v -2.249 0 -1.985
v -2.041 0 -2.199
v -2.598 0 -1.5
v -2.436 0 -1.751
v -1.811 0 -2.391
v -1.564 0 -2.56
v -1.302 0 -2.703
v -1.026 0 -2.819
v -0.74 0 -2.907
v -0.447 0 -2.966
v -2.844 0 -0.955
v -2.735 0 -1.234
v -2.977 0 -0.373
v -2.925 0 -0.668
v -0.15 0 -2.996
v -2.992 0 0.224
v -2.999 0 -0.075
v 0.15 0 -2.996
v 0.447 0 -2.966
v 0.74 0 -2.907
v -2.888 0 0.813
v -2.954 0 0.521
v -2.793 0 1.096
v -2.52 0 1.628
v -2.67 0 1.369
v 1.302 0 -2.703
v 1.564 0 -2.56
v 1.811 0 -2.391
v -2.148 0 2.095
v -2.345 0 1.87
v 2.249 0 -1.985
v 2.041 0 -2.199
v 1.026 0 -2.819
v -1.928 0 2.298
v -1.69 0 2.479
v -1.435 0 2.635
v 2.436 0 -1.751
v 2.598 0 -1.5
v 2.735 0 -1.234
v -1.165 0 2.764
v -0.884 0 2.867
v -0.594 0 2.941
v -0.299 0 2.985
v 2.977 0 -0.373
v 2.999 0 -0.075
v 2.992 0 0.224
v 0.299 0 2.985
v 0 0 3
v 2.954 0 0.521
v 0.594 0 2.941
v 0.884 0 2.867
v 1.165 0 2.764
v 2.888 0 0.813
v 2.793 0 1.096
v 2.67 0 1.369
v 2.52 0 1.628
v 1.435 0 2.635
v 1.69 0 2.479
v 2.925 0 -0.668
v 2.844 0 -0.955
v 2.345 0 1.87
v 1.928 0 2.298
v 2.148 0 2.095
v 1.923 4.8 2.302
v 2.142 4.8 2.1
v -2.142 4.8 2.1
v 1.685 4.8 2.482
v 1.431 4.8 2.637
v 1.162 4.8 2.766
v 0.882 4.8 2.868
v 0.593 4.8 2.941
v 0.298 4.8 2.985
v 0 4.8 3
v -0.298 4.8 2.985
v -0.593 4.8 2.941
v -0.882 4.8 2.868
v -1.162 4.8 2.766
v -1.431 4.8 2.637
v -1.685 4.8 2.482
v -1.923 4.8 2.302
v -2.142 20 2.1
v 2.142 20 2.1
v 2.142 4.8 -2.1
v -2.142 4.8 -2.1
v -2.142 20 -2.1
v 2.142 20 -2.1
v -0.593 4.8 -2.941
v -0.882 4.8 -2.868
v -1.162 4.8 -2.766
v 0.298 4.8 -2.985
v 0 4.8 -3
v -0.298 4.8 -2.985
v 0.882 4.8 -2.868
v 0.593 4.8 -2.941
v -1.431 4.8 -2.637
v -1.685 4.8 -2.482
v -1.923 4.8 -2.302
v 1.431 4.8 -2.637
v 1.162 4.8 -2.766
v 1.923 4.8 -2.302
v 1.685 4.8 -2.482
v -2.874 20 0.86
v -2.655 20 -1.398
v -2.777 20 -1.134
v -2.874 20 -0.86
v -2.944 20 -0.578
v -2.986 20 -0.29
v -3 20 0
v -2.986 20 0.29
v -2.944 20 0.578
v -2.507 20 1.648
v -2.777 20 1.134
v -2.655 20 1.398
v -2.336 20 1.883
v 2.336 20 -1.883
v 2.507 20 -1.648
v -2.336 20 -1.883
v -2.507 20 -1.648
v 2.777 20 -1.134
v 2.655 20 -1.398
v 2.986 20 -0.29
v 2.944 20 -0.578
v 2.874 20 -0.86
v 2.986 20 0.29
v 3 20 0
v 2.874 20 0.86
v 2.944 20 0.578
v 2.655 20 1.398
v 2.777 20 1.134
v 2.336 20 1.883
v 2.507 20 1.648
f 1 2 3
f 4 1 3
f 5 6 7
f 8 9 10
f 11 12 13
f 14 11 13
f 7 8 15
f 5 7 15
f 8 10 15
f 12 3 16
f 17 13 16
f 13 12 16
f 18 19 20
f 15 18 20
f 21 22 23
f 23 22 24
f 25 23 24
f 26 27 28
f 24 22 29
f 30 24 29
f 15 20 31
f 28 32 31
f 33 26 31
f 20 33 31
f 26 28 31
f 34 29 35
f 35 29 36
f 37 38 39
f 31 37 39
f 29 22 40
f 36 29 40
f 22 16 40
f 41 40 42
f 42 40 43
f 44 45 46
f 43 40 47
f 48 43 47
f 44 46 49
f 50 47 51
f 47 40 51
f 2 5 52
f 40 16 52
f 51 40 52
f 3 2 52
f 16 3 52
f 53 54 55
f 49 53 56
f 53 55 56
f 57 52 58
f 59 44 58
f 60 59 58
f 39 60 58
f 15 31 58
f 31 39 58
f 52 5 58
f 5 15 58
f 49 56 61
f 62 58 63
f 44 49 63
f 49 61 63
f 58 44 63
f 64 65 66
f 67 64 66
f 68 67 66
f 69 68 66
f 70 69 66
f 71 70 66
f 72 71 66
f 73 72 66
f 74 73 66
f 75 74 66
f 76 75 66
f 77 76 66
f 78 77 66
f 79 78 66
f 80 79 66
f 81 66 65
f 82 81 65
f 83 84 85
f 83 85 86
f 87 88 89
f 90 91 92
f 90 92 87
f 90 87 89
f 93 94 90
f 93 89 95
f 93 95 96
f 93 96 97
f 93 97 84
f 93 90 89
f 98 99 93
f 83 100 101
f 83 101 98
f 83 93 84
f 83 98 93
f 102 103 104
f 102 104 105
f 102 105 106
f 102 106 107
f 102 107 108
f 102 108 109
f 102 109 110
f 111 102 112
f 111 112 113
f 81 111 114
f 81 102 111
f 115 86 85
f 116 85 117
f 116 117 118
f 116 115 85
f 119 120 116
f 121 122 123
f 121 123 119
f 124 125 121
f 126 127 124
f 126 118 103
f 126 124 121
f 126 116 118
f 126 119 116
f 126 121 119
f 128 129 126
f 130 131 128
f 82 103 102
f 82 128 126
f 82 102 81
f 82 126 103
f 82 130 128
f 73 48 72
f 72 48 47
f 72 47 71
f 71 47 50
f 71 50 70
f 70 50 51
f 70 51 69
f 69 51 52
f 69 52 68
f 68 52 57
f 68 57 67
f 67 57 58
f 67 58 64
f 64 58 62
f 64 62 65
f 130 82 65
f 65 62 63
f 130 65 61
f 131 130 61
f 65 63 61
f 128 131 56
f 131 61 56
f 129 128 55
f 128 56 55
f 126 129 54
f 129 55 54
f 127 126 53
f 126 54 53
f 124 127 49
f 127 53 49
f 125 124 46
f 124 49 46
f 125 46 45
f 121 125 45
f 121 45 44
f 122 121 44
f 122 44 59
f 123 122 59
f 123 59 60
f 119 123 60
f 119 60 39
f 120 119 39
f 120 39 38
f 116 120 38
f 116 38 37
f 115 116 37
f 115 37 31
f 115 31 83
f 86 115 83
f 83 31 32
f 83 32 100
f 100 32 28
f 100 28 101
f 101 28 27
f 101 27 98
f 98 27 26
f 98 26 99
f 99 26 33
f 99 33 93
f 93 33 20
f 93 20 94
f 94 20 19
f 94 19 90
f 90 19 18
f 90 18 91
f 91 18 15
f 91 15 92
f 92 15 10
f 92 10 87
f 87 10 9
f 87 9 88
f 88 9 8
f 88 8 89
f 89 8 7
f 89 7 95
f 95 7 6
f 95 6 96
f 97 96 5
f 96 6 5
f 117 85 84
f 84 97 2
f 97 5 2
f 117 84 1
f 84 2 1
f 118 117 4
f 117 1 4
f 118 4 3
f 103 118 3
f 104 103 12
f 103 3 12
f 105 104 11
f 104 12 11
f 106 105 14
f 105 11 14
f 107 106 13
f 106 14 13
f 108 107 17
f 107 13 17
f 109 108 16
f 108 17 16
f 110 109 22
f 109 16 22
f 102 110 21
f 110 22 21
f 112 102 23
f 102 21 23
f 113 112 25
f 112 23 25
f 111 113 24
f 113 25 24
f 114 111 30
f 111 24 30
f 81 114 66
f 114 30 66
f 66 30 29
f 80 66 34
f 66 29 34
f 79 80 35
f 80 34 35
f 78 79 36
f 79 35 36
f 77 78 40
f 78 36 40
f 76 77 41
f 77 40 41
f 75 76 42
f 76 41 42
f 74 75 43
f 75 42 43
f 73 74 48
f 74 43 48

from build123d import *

# Parameters (mm, degrees)
SKETCH_1_R          = 3
EXTRUDE_1_DEPTH     = 20
CUT_EXTRUDE_START   = -15.2
CUT_EXTRUDE_2_DEPTH = 15.2


with BuildPart() as part:
    # 草图1 → 凸台-拉伸1 (new body)
    with BuildSketch(Plane(origin=(0, 0, 0), x_dir=(1, 0, 0), z_dir=(0, 1, 0))):
        with Locations(Location((0, 0, 0), (0, 0, 270))):
            Circle(SKETCH_1_R)
    extrude(amount=EXTRUDE_1_DEPTH)

    # 草图2 → 切除-拉伸2 (cut)
    with BuildSketch(Plane(origin=(0, 20, 0), x_dir=(1, 0, 0), z_dir=(0, 1, 0)).offset(CUT_EXTRUDE_START)):
        with BuildLine():
            Line((-2.142428529, 2.1), (2.142428529, 2.1))
            ThreePointArc((2.142428529, 2.1), (0, 3), (-2.142428529, 2.1))
        make_face()
        with BuildLine():
            Line((-2.142428529, -2.1), (2.142428529, -2.1))
            ThreePointArc((2.142428529, -2.1), (0, -3), (-2.142428529, -2.1))
        make_face()
    extrude(amount=CUT_EXTRUDE_2_DEPTH, mode=Mode.SUBTRACT)


solid = part.part
